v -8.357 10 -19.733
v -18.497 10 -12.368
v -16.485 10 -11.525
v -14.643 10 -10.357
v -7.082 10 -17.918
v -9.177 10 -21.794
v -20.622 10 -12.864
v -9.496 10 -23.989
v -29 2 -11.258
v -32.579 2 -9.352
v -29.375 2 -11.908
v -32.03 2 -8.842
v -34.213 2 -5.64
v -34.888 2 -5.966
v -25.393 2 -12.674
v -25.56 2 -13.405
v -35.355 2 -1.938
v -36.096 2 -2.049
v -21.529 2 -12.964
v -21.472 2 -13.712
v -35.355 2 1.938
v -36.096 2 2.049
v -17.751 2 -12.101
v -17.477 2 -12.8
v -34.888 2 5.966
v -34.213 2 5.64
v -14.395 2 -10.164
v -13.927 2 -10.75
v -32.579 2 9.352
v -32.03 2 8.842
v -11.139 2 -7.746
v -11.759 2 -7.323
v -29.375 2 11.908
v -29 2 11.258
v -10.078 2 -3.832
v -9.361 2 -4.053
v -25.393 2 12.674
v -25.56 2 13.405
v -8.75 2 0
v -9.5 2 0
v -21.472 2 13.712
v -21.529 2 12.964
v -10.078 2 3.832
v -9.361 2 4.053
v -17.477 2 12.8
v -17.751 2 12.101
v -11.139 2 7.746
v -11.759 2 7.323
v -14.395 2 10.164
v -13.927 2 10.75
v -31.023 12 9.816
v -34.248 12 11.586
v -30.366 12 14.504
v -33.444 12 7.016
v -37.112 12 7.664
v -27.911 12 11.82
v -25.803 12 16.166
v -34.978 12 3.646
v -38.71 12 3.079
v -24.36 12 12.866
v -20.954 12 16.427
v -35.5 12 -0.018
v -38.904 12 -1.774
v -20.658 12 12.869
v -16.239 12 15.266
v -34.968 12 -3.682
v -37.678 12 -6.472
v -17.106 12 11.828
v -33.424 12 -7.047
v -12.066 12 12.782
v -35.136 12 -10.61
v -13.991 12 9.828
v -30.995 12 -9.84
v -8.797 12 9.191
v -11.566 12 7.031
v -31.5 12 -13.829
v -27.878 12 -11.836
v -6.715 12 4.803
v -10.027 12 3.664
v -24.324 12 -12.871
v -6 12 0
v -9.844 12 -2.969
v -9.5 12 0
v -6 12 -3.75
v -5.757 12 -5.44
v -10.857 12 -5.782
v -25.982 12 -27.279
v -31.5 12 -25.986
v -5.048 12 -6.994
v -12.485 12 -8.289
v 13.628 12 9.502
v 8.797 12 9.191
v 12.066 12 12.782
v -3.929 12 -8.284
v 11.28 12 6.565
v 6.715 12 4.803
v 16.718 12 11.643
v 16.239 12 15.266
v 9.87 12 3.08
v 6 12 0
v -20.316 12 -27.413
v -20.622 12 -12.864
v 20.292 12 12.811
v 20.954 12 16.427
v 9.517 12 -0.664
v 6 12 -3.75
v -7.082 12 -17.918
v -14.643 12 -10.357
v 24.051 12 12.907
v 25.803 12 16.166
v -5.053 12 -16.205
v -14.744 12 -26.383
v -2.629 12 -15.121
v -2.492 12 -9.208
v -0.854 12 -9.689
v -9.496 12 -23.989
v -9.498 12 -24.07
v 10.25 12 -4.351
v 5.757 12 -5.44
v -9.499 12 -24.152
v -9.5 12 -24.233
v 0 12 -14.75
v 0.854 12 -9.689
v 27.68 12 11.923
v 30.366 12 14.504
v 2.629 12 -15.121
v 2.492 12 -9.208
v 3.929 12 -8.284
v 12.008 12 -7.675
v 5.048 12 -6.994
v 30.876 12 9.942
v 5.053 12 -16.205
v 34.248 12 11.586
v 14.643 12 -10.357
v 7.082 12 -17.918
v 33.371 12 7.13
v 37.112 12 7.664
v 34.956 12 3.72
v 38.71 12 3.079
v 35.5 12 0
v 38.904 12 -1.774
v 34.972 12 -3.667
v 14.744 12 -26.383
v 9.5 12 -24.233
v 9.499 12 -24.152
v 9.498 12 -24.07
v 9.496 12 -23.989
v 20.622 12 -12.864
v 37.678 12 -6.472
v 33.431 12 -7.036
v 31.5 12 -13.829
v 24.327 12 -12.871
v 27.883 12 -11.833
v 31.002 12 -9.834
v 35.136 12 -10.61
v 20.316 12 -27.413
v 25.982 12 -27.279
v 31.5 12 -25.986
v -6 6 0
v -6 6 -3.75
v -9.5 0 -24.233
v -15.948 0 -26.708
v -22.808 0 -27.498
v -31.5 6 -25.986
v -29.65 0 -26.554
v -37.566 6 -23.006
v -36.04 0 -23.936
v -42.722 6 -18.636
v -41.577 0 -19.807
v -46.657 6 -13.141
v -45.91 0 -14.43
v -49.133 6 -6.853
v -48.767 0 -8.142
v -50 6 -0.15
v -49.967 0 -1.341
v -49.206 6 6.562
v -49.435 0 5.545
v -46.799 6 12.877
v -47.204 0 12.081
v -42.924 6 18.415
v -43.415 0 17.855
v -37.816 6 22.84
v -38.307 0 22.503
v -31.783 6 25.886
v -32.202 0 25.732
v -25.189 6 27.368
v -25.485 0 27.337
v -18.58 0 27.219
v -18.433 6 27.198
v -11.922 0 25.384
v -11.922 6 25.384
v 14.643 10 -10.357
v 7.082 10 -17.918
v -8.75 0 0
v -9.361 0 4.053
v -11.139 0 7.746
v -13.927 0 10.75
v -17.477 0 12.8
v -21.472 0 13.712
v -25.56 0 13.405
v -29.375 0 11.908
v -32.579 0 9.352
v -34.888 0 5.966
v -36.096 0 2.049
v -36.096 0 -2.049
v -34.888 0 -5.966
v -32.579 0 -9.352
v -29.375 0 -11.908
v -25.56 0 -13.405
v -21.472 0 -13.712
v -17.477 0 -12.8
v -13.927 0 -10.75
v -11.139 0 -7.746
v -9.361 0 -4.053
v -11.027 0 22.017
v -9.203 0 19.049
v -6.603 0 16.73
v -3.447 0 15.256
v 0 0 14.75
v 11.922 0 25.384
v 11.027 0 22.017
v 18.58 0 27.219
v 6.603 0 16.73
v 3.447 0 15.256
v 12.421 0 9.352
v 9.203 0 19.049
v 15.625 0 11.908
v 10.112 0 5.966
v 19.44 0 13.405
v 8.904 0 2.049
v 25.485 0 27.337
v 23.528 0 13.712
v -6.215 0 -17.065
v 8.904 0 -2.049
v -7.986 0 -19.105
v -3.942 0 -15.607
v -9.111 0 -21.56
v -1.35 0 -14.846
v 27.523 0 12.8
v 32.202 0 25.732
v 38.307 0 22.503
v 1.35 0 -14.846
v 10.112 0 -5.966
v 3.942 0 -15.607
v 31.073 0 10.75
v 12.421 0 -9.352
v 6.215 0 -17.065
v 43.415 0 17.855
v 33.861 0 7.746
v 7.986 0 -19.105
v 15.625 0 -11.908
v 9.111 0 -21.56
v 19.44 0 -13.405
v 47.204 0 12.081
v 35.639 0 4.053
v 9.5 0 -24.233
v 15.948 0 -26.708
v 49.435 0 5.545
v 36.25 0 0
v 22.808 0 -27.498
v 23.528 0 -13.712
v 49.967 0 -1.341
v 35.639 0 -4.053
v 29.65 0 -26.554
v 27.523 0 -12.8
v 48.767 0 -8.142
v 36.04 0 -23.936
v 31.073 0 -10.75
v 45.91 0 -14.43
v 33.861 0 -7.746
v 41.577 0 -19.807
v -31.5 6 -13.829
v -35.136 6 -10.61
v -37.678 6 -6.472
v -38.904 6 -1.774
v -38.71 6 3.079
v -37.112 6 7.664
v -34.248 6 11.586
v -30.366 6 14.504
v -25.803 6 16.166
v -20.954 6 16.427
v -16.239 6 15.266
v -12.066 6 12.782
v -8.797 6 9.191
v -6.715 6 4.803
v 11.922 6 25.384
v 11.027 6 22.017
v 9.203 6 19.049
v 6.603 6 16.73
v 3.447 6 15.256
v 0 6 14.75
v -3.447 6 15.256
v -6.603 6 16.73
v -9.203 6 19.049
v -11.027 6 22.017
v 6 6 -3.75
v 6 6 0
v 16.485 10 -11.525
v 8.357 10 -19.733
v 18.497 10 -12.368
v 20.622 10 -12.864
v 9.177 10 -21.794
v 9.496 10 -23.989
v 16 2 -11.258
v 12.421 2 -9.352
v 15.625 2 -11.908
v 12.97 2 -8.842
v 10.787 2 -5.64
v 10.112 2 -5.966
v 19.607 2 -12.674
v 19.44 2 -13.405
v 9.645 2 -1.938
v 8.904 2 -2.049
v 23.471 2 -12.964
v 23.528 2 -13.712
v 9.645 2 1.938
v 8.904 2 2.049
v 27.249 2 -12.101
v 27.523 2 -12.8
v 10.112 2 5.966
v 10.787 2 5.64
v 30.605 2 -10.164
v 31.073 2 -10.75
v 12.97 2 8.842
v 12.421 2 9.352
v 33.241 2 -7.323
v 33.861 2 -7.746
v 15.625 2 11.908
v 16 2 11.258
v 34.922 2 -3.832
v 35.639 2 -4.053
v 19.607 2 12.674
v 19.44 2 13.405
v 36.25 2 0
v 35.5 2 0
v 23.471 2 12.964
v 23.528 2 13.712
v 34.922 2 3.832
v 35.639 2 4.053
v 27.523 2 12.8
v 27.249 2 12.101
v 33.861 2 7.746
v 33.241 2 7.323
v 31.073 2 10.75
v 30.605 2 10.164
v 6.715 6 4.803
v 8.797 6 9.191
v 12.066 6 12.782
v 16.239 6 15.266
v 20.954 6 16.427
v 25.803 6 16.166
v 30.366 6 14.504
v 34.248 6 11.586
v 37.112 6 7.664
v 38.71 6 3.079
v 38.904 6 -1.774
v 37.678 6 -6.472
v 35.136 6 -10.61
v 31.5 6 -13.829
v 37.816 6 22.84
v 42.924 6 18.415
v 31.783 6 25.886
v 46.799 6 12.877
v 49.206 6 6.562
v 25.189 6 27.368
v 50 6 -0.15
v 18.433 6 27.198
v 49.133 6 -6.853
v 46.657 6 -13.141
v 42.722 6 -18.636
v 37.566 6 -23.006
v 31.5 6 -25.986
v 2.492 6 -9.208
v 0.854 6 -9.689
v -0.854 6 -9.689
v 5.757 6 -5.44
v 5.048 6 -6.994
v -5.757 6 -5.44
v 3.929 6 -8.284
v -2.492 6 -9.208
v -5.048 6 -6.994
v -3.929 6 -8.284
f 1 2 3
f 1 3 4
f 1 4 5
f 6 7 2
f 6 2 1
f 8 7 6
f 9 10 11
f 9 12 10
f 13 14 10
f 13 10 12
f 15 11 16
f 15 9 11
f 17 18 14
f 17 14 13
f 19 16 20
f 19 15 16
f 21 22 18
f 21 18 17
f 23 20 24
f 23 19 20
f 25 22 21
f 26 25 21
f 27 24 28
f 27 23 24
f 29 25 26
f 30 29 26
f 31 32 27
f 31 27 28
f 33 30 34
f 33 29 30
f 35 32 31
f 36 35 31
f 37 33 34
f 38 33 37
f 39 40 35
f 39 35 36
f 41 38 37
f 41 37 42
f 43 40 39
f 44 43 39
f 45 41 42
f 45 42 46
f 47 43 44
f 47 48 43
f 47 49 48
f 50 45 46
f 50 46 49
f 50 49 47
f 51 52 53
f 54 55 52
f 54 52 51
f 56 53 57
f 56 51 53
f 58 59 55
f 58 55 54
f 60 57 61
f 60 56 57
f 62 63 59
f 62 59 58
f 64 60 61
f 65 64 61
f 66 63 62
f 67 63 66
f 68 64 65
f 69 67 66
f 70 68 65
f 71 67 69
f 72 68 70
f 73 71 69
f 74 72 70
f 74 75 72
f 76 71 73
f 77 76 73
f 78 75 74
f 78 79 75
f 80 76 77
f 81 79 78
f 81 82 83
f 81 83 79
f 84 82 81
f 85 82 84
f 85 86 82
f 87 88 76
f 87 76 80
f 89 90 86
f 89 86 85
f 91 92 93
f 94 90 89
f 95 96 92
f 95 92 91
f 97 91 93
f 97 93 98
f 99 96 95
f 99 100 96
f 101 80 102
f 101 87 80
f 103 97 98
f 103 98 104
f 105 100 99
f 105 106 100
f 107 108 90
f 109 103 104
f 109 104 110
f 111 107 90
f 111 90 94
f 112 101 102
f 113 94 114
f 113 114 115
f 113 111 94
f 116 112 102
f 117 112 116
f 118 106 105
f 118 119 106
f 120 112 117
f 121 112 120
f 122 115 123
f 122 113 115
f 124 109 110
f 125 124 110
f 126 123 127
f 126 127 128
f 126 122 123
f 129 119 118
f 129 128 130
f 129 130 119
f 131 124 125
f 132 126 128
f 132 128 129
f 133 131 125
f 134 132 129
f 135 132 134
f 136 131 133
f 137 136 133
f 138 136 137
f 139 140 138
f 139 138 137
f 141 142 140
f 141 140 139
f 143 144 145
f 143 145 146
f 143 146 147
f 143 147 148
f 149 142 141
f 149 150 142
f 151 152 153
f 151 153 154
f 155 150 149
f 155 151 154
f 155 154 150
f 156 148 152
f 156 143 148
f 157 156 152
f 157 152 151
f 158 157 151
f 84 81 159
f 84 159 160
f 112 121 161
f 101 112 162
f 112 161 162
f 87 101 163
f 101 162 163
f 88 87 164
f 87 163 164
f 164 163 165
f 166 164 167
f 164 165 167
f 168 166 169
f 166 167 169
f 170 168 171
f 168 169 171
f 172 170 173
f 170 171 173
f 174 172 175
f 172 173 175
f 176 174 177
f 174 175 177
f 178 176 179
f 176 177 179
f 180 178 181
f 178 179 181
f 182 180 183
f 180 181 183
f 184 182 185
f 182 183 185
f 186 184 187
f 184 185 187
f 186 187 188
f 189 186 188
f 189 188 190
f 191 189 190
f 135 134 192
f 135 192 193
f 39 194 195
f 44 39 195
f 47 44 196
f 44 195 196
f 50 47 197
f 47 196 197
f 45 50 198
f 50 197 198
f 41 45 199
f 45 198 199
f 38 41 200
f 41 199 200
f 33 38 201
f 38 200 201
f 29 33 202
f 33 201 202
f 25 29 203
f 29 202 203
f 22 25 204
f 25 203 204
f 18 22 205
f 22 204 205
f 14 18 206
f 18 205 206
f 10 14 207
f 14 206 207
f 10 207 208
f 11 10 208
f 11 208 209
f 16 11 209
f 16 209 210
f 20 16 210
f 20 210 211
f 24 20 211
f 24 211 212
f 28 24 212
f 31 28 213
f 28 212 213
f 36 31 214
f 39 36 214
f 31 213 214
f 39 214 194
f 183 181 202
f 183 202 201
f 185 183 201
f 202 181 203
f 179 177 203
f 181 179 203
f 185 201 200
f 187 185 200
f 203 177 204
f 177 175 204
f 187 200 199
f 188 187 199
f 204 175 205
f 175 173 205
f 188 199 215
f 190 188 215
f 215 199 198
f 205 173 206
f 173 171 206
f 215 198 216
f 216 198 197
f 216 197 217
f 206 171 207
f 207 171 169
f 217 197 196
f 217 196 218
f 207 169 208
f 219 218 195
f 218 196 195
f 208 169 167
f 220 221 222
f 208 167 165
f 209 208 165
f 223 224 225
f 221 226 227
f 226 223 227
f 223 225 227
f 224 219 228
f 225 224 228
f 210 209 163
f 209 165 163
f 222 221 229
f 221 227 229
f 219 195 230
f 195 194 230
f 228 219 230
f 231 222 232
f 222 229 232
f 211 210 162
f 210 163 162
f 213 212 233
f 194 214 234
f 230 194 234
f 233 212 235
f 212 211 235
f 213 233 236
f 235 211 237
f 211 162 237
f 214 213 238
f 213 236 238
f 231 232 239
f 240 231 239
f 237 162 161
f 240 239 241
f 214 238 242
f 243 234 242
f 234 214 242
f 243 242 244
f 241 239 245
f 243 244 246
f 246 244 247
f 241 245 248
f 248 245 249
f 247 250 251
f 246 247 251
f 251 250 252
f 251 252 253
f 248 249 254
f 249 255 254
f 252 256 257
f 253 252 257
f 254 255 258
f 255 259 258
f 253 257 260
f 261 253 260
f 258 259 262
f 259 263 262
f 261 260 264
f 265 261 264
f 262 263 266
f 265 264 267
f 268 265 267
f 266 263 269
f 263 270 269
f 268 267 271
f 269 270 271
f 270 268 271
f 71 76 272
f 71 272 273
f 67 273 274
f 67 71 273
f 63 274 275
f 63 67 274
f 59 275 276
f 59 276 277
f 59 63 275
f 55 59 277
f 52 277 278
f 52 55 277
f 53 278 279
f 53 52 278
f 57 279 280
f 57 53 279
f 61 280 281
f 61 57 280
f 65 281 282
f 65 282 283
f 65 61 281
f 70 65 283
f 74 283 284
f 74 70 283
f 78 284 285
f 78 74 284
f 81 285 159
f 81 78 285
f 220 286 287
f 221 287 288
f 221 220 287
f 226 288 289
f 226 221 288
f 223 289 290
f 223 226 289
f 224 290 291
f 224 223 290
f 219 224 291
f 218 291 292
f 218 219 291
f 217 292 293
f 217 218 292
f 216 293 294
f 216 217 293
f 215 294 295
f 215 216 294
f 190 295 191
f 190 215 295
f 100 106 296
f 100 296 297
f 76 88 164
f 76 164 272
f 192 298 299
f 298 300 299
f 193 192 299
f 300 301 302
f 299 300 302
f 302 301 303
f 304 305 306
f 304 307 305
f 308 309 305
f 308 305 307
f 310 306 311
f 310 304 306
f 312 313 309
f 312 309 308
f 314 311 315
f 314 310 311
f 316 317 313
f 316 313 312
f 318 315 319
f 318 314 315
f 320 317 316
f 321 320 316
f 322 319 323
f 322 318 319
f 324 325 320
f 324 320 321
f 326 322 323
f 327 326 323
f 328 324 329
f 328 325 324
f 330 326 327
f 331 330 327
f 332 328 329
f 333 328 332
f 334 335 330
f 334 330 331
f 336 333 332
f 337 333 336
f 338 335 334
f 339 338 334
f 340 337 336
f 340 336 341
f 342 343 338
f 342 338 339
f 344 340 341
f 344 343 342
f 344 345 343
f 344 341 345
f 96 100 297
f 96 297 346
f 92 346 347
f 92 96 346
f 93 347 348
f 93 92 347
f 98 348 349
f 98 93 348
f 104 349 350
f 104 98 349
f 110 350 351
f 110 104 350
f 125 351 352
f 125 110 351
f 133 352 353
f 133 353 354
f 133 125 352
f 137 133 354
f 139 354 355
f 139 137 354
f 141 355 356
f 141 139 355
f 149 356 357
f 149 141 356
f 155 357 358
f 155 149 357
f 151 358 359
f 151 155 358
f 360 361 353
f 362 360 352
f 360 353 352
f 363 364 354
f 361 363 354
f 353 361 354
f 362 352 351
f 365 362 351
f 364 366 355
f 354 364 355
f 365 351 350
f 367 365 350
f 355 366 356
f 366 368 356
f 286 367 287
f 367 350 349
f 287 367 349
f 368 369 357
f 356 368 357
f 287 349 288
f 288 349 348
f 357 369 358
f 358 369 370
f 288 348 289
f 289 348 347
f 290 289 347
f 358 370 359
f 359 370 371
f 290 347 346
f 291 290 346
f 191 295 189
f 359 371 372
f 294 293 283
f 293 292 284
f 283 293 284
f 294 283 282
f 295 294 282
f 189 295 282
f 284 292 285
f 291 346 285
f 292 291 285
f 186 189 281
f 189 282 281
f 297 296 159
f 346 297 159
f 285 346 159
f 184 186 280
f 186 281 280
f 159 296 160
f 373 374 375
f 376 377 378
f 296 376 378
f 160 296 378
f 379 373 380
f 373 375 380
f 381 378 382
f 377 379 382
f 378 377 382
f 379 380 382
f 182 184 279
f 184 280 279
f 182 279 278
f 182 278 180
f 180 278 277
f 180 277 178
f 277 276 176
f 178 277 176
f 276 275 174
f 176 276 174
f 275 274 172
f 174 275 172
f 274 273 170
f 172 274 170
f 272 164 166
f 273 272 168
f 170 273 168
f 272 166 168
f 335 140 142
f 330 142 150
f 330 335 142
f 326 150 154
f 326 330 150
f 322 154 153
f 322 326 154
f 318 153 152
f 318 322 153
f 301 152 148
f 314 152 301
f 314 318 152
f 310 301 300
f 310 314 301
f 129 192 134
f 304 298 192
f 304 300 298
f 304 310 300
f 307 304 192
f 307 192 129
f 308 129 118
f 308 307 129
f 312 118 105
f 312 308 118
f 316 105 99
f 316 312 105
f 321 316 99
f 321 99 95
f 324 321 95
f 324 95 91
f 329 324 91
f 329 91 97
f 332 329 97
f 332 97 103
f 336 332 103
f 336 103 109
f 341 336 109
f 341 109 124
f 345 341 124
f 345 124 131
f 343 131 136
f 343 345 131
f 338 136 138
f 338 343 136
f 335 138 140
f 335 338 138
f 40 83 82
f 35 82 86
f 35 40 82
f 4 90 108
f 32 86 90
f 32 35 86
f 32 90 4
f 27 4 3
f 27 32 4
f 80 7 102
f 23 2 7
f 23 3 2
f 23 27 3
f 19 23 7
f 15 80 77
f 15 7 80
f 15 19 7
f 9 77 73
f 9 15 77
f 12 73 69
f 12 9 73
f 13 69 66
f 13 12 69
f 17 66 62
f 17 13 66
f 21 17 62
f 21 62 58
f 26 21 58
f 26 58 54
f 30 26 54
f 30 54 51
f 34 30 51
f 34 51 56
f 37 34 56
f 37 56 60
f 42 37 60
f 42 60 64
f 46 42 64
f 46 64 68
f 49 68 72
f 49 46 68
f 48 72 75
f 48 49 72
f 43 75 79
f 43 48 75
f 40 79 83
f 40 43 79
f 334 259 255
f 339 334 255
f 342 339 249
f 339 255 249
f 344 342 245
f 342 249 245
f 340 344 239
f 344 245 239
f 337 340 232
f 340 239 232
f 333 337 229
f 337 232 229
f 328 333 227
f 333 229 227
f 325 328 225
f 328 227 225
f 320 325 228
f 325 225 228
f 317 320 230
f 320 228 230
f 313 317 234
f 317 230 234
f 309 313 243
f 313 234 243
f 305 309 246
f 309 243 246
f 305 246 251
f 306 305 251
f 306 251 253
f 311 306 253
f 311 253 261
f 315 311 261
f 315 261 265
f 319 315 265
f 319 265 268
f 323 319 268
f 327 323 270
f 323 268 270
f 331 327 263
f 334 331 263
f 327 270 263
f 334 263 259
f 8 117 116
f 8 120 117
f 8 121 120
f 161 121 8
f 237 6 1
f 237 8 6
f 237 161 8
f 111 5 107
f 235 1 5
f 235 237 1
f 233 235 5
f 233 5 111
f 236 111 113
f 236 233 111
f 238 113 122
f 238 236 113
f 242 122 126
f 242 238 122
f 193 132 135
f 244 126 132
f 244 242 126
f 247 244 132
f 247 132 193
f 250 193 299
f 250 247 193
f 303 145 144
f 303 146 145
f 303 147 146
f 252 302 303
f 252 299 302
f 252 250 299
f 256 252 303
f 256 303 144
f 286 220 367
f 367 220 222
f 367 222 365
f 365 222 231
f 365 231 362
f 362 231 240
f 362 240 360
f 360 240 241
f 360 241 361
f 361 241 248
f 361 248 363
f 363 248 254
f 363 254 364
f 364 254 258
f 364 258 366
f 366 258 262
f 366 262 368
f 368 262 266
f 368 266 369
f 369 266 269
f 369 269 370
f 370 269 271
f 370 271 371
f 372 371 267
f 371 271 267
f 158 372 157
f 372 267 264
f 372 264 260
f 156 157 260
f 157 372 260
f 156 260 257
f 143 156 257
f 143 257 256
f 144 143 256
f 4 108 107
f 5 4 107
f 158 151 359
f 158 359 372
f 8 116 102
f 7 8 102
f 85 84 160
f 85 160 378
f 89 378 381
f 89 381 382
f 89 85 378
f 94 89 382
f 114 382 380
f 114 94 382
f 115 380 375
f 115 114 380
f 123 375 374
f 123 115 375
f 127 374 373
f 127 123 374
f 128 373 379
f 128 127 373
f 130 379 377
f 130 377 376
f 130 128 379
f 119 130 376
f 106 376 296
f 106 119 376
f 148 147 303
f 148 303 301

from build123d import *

# Parameters (mm, degrees)
EXTRUDE_1_DEPTH     = 12
SKETCH_2_R          = 9.5
SKETCH_2_R_2        = 12
CUT_EXTRUDE_1_DEPTH = 13
CUT_EXTRUDE_2_DEPTH = 6
SKETCH_4_R          = 13
CUT_EXTRUDE_3_DEPTH = 13
SKETCH_7_R          = 13.75
CUT_EXTRUDE_5_DEPTH = 2
CUT_EXTRUDE_6_DEPTH = 2


with BuildPart() as part:
    # Эскиз1 → Бобышка-Вытянуть1 (new body)
    with BuildSketch(Plane(origin=(0, 0, 0), x_dir=(1, 0, 0), z_dir=(0, 1, 0))):
        with BuildLine():
            ThreePointArc((0, -15.811388301), (50, 0), (0, 15.811388301))
            ThreePointArc((0, 15.811388301), (-50, 0), (0, -15.811388301))
        make_face()
    extrude(amount=EXTRUDE_1_DEPTH)

    # Эскиз2 → Вырез-Вытянуть1 (cut, through all)
    with BuildSketch(Plane(origin=(0, 0, 0), x_dir=(1, 0, 0), z_dir=(0, 1, 0))):
        with Locations((0, 24.25)):
            Circle(SKETCH_2_R)
        with Locations((0, -26.75)):
            Circle(SKETCH_2_R_2)
    extrude(amount=CUT_EXTRUDE_1_DEPTH, mode=Mode.SUBTRACT)

    # Эскиз3 → Вырез-Вытянуть2 (cut)
    with BuildSketch(Plane(origin=(0, 12, 0), x_dir=(1, 0, 0), z_dir=(0, 1, 0))):
        with BuildLine():
            Line((-6, 0), (-6, 3.75))
            ThreePointArc((-6, 3.75), (0, 9.75), (6, 3.75))
            Line((6, 3.75), (6, 0))
            ThreePointArc((6, 0), (30.366066361, -14.504309704), (31.5, 13.829316686))
            Line((31.5, 13.829316686), (31.5, 40))
            Line((31.5, 40), (71.5, 40))
            Line((71.5, 40), (71.5, -30))
            Line((71.5, -30), (-71.5, -30))
            Line((-71.5, -30), (-71.5, 40))
            Line((-71.5, 40), (-31.5, 40))
            Line((-31.5, 40), (-31.5, 13.829316686))
            ThreePointArc((-31.5, 13.829316686), (-30.366066361, -14.504309704), (-6, 0))
        make_face()
    extrude(amount=-CUT_EXTRUDE_2_DEPTH, mode=Mode.SUBTRACT)

    # Эскиз4 → Вырез-Вытянуть3 (cut, through all)
    with BuildSketch(Plane(origin=(0, 0, 0), x_dir=(1, 0, 0), z_dir=(0, 1, 0))):
        with Locations((-22.5, 0)):
            Circle(SKETCH_4_R)
        with Locations((22.5, 0)):
            Circle(SKETCH_4_R)
    extrude(amount=CUT_EXTRUDE_3_DEPTH, mode=Mode.SUBTRACT)

    # Эскиз7 → Вырез-Вытянуть5 (cut)
    with BuildSketch(Plane.XZ):
        with Locations((-22.5, 0)):
            Circle(SKETCH_7_R)
        with Locations((22.5, 0)):
            Circle(SKETCH_7_R)
    extrude(amount=-CUT_EXTRUDE_5_DEPTH, mode=Mode.SUBTRACT)

    # Эскиз8 → Вырез-Вытянуть6 (cut)
    with BuildSketch(Plane(origin=(0, 12, 0), x_dir=(1, 0, 0), z_dir=(0, 1, 0))):
        Polygon((-9.242640687, 24.242640687), (-26.920310217, 6.564971157), (-22.67766953, 2.32233047), (-5, 20), align=None)
        Polygon((9.242640687, 24.242640687), (26.920310217, 6.564971157), (22.67766953, 2.32233047), (5, 20), align=None)
    extrude(amount=-CUT_EXTRUDE_6_DEPTH, mode=Mode.SUBTRACT)


solid = part.part
